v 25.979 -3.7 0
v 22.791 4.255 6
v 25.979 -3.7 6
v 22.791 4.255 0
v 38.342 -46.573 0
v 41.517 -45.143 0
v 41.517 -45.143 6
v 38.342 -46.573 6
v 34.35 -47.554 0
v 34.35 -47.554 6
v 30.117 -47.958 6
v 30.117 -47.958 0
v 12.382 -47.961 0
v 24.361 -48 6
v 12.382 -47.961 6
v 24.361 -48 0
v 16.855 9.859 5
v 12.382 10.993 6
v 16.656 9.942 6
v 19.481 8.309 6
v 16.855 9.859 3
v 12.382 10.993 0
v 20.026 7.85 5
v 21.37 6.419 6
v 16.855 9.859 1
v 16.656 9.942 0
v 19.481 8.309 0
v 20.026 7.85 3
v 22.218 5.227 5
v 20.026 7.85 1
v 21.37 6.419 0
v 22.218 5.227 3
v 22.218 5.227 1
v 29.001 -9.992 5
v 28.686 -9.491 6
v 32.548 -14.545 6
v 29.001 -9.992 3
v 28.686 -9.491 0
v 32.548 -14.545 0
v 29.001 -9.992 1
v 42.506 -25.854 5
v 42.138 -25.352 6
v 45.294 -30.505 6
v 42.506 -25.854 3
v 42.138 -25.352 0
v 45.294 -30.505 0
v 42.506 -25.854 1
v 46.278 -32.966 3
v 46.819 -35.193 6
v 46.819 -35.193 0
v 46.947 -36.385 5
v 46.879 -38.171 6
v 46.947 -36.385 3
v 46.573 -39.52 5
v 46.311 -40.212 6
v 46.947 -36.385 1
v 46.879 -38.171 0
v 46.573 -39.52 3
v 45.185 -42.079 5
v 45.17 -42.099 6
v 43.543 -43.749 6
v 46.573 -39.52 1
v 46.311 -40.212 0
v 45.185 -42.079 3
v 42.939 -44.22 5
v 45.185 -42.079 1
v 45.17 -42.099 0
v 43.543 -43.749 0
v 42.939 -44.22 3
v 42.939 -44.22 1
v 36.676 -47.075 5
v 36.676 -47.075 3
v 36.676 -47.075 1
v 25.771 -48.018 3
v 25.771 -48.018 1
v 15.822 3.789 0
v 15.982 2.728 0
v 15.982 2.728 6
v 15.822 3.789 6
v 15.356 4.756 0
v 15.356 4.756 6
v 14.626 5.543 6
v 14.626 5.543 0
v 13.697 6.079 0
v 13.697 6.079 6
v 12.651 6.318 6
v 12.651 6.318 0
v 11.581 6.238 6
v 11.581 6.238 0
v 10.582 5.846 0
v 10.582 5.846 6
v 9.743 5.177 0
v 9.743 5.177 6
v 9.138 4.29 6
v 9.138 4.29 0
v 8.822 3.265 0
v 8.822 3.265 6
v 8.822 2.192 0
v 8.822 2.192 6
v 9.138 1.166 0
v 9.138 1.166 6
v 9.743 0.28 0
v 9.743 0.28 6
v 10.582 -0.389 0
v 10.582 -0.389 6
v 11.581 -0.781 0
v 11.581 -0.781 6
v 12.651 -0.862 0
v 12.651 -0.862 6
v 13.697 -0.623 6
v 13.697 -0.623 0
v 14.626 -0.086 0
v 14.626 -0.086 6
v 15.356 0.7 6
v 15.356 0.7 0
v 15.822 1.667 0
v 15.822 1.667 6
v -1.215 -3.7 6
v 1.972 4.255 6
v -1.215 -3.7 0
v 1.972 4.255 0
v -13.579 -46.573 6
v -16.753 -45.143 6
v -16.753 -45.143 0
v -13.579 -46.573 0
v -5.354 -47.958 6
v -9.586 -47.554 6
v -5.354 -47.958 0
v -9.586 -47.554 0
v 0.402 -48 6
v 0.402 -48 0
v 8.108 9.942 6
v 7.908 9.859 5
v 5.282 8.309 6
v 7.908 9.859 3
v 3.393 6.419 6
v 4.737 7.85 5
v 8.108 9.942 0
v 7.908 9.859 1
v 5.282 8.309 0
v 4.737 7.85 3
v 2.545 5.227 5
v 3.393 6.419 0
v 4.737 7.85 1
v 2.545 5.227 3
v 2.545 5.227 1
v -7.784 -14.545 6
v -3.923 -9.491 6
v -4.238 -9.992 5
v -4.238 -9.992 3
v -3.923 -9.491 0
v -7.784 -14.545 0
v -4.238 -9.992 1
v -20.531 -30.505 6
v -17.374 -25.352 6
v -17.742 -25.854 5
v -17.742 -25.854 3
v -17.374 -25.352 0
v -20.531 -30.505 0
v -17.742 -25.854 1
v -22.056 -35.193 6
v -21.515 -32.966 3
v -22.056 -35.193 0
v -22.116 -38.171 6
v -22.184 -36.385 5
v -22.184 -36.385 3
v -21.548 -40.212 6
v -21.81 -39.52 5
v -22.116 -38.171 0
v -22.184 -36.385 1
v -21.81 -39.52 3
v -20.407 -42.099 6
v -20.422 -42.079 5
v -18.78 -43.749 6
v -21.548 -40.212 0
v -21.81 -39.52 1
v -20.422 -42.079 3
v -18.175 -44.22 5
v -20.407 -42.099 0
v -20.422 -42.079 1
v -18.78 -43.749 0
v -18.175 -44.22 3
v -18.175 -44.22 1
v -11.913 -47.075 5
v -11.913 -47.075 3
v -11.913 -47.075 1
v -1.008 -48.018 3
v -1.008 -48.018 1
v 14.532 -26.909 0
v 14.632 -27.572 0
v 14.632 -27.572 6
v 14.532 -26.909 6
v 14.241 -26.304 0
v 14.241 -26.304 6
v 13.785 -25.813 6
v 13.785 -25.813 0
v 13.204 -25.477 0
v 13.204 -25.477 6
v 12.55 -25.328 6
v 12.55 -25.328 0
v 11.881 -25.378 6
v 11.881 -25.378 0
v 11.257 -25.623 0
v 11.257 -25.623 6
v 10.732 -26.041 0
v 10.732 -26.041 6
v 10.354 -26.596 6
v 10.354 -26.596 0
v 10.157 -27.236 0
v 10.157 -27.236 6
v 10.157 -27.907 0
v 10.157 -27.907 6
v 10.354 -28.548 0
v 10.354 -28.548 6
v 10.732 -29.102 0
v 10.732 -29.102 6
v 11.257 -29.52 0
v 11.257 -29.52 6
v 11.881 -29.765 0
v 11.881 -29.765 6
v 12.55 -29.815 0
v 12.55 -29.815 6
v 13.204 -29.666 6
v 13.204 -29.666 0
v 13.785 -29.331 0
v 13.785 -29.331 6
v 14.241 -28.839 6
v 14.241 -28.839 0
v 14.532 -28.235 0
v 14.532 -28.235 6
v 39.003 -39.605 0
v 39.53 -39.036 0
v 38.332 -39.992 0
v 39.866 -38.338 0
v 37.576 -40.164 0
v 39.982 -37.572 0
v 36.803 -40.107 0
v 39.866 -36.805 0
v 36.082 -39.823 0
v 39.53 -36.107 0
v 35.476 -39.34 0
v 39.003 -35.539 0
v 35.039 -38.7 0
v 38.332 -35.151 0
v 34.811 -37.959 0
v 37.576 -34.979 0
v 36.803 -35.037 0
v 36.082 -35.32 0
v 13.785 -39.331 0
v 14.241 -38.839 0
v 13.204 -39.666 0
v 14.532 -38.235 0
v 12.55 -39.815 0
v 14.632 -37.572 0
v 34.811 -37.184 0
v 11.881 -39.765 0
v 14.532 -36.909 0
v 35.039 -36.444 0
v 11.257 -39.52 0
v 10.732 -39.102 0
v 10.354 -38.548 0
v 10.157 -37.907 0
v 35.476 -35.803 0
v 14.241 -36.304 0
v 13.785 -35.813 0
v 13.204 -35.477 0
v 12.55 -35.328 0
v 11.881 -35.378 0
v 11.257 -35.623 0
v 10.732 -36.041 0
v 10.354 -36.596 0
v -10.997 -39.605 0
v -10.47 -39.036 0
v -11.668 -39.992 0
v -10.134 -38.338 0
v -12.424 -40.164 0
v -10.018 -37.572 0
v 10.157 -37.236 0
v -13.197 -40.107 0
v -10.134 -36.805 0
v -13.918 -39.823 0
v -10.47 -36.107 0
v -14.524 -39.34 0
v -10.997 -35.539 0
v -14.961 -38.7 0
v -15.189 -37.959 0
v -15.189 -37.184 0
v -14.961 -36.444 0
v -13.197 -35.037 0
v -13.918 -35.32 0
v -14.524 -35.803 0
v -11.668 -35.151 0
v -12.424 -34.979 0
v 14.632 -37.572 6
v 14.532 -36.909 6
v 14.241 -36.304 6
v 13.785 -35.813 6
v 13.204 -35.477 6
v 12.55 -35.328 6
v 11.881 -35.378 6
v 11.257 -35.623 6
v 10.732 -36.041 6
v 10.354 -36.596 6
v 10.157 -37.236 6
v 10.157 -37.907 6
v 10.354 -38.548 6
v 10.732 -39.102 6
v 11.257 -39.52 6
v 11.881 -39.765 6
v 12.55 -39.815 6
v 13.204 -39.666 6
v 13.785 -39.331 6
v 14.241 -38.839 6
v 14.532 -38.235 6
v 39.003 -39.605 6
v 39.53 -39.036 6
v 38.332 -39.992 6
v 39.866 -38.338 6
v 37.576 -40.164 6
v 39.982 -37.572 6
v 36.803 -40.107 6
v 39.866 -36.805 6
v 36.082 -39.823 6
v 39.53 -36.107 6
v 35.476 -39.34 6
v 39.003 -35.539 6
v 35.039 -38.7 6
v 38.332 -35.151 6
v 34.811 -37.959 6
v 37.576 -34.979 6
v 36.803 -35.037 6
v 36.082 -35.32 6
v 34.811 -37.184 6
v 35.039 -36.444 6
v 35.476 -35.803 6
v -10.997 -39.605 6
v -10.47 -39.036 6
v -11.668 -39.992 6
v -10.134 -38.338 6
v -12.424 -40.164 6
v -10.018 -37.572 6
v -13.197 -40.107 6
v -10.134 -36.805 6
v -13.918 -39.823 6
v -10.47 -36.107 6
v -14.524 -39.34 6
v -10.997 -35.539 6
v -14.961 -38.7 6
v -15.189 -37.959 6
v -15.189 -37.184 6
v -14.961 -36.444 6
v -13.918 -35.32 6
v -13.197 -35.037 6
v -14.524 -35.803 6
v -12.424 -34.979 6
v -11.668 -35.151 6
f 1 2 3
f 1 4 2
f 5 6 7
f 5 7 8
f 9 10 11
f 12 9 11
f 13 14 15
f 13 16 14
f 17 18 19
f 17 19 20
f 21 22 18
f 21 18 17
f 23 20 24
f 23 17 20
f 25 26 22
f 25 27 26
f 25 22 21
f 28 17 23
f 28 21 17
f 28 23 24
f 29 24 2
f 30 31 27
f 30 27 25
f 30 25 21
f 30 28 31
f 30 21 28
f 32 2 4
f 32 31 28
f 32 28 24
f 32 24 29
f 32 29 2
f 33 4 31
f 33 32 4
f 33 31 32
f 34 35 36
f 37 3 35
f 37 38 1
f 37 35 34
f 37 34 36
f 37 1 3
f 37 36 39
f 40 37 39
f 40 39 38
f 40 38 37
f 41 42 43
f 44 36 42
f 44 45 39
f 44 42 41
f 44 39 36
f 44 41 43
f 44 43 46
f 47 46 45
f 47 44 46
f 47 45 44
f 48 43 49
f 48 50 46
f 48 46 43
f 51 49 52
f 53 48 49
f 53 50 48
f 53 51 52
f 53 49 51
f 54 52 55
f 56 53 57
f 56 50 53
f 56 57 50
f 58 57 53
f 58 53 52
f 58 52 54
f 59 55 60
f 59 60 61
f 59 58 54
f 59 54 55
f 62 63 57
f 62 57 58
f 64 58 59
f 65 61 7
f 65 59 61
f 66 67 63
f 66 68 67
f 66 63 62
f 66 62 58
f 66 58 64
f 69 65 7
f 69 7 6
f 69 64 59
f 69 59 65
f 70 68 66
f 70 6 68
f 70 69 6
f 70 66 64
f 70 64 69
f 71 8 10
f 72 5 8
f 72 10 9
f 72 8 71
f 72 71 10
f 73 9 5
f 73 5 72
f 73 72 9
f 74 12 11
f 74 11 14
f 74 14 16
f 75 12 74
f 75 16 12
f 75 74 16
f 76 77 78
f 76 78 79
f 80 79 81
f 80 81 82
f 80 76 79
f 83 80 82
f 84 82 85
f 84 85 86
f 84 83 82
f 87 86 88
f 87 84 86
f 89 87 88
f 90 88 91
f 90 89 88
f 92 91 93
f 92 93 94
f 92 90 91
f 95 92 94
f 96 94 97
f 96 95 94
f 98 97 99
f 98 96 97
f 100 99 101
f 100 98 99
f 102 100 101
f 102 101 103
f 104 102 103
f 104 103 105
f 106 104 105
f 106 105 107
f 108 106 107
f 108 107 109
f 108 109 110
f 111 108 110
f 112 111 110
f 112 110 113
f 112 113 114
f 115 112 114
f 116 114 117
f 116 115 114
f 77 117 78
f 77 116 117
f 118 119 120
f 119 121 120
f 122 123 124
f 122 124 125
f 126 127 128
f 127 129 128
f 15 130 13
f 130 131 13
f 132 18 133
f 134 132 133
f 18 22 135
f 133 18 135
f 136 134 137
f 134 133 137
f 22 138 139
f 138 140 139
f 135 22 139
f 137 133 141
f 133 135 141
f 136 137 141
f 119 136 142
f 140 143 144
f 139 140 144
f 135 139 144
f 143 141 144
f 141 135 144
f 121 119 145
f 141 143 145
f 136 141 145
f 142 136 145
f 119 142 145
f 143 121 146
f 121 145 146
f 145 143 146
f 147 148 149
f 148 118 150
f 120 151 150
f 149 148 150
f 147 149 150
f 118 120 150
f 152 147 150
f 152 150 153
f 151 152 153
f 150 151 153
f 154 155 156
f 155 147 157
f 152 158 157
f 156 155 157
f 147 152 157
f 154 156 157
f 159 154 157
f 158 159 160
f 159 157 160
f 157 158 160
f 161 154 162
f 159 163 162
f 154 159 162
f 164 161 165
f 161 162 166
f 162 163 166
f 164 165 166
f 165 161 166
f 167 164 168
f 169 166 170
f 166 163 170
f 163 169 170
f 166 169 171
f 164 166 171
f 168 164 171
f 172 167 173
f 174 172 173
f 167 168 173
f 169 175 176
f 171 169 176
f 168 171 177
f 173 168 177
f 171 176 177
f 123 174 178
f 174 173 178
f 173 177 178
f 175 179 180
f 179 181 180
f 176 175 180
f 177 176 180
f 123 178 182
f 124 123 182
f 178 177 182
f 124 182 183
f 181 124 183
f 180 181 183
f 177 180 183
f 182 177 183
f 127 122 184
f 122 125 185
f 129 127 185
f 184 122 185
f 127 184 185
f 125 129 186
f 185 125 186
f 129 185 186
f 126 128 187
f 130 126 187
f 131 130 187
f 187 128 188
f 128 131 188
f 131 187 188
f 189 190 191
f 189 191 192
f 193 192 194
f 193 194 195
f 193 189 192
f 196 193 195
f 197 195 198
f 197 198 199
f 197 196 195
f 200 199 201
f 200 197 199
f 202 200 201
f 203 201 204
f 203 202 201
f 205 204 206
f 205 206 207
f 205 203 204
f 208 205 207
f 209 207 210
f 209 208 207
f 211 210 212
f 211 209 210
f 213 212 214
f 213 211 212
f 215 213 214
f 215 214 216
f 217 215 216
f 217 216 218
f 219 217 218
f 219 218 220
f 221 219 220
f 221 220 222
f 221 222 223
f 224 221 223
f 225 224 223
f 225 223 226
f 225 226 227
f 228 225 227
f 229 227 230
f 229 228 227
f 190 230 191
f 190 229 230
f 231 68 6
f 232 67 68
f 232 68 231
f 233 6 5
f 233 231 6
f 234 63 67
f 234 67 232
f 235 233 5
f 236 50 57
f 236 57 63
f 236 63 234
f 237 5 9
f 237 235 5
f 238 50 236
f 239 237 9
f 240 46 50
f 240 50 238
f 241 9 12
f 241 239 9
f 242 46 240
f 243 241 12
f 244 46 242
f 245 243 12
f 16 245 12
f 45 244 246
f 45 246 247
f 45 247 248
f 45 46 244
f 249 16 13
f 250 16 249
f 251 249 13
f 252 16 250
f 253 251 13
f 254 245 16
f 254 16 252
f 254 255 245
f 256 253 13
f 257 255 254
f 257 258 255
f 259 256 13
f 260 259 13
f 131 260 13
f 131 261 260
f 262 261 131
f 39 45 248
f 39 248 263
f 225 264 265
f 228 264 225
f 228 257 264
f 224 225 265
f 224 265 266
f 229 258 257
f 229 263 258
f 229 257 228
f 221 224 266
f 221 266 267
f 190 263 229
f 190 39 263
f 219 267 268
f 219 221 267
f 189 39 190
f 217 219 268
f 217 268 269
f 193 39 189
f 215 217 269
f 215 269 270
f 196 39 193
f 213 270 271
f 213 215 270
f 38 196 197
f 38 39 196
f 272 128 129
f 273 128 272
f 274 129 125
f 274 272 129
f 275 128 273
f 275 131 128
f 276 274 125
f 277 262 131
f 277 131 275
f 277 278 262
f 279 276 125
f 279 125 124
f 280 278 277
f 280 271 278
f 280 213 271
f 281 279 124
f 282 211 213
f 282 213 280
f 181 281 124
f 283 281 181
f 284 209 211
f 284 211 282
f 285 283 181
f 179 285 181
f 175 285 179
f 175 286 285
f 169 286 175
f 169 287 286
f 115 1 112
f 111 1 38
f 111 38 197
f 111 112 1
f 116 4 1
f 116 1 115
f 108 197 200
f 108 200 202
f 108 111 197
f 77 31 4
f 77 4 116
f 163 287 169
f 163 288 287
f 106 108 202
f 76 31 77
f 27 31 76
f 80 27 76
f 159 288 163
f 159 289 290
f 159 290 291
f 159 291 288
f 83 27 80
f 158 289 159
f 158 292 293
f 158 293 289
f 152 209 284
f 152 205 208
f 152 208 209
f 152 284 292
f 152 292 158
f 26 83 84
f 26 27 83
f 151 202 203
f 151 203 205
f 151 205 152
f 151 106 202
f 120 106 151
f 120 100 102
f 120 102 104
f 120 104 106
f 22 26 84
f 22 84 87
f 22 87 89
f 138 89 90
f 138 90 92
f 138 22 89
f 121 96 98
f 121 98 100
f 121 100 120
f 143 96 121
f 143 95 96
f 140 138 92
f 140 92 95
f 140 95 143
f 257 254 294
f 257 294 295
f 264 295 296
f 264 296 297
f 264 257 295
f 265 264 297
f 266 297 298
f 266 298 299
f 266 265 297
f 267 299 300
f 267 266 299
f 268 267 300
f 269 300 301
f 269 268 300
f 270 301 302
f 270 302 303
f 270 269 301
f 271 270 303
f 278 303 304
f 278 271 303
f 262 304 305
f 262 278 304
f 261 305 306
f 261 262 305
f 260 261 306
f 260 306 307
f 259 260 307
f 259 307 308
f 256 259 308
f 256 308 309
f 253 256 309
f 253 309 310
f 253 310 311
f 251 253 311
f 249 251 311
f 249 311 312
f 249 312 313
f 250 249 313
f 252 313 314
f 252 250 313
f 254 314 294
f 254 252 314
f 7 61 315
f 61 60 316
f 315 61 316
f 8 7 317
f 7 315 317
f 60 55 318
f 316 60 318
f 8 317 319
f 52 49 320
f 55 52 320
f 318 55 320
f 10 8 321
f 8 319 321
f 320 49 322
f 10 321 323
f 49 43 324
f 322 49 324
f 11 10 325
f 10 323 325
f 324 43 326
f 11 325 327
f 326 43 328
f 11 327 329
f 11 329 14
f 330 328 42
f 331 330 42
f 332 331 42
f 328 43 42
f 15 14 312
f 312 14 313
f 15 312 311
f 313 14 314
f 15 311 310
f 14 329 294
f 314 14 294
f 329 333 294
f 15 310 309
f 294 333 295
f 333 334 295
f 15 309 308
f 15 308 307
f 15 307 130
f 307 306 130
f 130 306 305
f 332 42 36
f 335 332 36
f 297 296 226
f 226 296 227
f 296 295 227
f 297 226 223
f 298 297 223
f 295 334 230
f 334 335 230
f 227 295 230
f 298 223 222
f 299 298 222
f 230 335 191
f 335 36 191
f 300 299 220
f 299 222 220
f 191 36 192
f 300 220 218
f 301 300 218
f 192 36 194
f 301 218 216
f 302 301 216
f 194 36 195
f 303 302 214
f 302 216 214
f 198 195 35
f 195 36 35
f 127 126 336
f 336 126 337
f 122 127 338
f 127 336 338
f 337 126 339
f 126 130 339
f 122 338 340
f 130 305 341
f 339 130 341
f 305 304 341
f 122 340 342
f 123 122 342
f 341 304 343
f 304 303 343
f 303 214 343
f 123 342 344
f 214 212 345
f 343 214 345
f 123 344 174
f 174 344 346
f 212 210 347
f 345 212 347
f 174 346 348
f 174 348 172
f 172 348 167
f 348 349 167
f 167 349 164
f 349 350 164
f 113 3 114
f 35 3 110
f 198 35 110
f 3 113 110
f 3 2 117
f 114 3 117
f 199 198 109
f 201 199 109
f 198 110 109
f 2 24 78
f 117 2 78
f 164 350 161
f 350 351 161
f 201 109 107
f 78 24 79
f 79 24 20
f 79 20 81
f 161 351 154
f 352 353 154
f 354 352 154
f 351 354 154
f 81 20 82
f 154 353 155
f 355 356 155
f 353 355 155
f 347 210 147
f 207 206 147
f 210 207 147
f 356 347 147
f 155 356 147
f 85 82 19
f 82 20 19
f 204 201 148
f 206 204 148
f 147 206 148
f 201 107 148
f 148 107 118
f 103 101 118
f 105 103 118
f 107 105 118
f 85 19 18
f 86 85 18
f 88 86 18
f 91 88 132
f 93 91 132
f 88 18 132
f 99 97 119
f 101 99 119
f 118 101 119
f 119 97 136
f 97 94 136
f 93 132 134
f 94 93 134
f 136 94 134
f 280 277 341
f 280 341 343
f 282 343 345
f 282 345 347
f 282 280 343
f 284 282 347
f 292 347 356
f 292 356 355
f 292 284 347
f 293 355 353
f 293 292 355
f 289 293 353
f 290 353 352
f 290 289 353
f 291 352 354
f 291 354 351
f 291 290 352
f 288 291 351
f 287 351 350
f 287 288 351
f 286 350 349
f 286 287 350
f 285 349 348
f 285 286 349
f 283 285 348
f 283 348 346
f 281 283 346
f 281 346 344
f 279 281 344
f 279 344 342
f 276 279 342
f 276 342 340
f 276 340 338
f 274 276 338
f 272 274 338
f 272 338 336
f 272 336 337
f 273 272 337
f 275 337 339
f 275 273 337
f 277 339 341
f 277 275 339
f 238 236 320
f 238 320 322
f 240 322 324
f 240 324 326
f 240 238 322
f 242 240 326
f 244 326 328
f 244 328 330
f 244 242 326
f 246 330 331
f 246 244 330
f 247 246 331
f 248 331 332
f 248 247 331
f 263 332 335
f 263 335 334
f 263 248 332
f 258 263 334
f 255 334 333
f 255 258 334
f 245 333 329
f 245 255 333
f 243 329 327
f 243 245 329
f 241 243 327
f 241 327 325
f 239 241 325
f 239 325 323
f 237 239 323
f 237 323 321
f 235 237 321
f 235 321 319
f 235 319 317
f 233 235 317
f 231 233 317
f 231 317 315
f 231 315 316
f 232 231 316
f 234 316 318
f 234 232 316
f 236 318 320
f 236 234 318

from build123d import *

# Parameters (mm, degrees)
F0_R     = 2.6
F0_R_2   = 2.25
F0_R_3   = 3.6
F1_DEPTH = 6


with BuildPart() as f1:
    # F0 (on Top) → F1 (new body)
    with BuildSketch(Plane.XY):
        with BuildLine():
            add(Edge.make_bspline(
                [(12.3816564046, 10.9933634271), (19.3595638757, 10.1792579399), (24.5360108363, 2.6425417879), (27.446875068, -11.0966661954), (43.4891807358, -24.3979927013), (49.6858011865, -40.3289697108), (35.7526995371, -49.6009690165), (22.2505851059, -47.6014968802), (12.3816564046, -47.9608047333)],
                knots=[0, 0, 0, 0, 0.1562933386, 0.3068522442, 0.4951740903, 0.6509751474, 0.7965649178, 1, 1, 1, 1], degree=3))
            add(Edge.make_bspline(
                [(12.3816564046, 10.9933634271), (5.4037489334, 10.1792579399), (0.2273019728, 2.6425417879), (-2.6835622588, -11.0966661954), (-18.7258679267, -24.3979927013), (-24.9224883773, -40.3289697108), (-10.9893867279, -49.6009690165), (2.5127277033, -47.6014968802), (12.3816564046, -47.9608047333)],
                knots=[0, 0, 0, 0, 0.1562933386, 0.3068522442, 0.4951740903, 0.6509751474, 0.7965649178, 1, 1, 1, 1], degree=3))
        make_face()
        with Locations((-12.6183435954, -37.5717511536)):
            Circle(F0_R, mode=Mode.SUBTRACT)
        with Locations((12.3816564046, -37.5717511536)):
            Circle(F0_R_2, mode=Mode.SUBTRACT)
        with Locations((37.3816564046, -37.5717511536)):
            Circle(F0_R, mode=Mode.SUBTRACT)
        with Locations((12.3816564046, -27.5717511536)):
            Circle(F0_R_2, mode=Mode.SUBTRACT)
        with Locations((12.3816564046, 2.7282488464)):
            Circle(F0_R_3, mode=Mode.SUBTRACT)
    extrude(amount=F1_DEPTH)


solid = f1.part
